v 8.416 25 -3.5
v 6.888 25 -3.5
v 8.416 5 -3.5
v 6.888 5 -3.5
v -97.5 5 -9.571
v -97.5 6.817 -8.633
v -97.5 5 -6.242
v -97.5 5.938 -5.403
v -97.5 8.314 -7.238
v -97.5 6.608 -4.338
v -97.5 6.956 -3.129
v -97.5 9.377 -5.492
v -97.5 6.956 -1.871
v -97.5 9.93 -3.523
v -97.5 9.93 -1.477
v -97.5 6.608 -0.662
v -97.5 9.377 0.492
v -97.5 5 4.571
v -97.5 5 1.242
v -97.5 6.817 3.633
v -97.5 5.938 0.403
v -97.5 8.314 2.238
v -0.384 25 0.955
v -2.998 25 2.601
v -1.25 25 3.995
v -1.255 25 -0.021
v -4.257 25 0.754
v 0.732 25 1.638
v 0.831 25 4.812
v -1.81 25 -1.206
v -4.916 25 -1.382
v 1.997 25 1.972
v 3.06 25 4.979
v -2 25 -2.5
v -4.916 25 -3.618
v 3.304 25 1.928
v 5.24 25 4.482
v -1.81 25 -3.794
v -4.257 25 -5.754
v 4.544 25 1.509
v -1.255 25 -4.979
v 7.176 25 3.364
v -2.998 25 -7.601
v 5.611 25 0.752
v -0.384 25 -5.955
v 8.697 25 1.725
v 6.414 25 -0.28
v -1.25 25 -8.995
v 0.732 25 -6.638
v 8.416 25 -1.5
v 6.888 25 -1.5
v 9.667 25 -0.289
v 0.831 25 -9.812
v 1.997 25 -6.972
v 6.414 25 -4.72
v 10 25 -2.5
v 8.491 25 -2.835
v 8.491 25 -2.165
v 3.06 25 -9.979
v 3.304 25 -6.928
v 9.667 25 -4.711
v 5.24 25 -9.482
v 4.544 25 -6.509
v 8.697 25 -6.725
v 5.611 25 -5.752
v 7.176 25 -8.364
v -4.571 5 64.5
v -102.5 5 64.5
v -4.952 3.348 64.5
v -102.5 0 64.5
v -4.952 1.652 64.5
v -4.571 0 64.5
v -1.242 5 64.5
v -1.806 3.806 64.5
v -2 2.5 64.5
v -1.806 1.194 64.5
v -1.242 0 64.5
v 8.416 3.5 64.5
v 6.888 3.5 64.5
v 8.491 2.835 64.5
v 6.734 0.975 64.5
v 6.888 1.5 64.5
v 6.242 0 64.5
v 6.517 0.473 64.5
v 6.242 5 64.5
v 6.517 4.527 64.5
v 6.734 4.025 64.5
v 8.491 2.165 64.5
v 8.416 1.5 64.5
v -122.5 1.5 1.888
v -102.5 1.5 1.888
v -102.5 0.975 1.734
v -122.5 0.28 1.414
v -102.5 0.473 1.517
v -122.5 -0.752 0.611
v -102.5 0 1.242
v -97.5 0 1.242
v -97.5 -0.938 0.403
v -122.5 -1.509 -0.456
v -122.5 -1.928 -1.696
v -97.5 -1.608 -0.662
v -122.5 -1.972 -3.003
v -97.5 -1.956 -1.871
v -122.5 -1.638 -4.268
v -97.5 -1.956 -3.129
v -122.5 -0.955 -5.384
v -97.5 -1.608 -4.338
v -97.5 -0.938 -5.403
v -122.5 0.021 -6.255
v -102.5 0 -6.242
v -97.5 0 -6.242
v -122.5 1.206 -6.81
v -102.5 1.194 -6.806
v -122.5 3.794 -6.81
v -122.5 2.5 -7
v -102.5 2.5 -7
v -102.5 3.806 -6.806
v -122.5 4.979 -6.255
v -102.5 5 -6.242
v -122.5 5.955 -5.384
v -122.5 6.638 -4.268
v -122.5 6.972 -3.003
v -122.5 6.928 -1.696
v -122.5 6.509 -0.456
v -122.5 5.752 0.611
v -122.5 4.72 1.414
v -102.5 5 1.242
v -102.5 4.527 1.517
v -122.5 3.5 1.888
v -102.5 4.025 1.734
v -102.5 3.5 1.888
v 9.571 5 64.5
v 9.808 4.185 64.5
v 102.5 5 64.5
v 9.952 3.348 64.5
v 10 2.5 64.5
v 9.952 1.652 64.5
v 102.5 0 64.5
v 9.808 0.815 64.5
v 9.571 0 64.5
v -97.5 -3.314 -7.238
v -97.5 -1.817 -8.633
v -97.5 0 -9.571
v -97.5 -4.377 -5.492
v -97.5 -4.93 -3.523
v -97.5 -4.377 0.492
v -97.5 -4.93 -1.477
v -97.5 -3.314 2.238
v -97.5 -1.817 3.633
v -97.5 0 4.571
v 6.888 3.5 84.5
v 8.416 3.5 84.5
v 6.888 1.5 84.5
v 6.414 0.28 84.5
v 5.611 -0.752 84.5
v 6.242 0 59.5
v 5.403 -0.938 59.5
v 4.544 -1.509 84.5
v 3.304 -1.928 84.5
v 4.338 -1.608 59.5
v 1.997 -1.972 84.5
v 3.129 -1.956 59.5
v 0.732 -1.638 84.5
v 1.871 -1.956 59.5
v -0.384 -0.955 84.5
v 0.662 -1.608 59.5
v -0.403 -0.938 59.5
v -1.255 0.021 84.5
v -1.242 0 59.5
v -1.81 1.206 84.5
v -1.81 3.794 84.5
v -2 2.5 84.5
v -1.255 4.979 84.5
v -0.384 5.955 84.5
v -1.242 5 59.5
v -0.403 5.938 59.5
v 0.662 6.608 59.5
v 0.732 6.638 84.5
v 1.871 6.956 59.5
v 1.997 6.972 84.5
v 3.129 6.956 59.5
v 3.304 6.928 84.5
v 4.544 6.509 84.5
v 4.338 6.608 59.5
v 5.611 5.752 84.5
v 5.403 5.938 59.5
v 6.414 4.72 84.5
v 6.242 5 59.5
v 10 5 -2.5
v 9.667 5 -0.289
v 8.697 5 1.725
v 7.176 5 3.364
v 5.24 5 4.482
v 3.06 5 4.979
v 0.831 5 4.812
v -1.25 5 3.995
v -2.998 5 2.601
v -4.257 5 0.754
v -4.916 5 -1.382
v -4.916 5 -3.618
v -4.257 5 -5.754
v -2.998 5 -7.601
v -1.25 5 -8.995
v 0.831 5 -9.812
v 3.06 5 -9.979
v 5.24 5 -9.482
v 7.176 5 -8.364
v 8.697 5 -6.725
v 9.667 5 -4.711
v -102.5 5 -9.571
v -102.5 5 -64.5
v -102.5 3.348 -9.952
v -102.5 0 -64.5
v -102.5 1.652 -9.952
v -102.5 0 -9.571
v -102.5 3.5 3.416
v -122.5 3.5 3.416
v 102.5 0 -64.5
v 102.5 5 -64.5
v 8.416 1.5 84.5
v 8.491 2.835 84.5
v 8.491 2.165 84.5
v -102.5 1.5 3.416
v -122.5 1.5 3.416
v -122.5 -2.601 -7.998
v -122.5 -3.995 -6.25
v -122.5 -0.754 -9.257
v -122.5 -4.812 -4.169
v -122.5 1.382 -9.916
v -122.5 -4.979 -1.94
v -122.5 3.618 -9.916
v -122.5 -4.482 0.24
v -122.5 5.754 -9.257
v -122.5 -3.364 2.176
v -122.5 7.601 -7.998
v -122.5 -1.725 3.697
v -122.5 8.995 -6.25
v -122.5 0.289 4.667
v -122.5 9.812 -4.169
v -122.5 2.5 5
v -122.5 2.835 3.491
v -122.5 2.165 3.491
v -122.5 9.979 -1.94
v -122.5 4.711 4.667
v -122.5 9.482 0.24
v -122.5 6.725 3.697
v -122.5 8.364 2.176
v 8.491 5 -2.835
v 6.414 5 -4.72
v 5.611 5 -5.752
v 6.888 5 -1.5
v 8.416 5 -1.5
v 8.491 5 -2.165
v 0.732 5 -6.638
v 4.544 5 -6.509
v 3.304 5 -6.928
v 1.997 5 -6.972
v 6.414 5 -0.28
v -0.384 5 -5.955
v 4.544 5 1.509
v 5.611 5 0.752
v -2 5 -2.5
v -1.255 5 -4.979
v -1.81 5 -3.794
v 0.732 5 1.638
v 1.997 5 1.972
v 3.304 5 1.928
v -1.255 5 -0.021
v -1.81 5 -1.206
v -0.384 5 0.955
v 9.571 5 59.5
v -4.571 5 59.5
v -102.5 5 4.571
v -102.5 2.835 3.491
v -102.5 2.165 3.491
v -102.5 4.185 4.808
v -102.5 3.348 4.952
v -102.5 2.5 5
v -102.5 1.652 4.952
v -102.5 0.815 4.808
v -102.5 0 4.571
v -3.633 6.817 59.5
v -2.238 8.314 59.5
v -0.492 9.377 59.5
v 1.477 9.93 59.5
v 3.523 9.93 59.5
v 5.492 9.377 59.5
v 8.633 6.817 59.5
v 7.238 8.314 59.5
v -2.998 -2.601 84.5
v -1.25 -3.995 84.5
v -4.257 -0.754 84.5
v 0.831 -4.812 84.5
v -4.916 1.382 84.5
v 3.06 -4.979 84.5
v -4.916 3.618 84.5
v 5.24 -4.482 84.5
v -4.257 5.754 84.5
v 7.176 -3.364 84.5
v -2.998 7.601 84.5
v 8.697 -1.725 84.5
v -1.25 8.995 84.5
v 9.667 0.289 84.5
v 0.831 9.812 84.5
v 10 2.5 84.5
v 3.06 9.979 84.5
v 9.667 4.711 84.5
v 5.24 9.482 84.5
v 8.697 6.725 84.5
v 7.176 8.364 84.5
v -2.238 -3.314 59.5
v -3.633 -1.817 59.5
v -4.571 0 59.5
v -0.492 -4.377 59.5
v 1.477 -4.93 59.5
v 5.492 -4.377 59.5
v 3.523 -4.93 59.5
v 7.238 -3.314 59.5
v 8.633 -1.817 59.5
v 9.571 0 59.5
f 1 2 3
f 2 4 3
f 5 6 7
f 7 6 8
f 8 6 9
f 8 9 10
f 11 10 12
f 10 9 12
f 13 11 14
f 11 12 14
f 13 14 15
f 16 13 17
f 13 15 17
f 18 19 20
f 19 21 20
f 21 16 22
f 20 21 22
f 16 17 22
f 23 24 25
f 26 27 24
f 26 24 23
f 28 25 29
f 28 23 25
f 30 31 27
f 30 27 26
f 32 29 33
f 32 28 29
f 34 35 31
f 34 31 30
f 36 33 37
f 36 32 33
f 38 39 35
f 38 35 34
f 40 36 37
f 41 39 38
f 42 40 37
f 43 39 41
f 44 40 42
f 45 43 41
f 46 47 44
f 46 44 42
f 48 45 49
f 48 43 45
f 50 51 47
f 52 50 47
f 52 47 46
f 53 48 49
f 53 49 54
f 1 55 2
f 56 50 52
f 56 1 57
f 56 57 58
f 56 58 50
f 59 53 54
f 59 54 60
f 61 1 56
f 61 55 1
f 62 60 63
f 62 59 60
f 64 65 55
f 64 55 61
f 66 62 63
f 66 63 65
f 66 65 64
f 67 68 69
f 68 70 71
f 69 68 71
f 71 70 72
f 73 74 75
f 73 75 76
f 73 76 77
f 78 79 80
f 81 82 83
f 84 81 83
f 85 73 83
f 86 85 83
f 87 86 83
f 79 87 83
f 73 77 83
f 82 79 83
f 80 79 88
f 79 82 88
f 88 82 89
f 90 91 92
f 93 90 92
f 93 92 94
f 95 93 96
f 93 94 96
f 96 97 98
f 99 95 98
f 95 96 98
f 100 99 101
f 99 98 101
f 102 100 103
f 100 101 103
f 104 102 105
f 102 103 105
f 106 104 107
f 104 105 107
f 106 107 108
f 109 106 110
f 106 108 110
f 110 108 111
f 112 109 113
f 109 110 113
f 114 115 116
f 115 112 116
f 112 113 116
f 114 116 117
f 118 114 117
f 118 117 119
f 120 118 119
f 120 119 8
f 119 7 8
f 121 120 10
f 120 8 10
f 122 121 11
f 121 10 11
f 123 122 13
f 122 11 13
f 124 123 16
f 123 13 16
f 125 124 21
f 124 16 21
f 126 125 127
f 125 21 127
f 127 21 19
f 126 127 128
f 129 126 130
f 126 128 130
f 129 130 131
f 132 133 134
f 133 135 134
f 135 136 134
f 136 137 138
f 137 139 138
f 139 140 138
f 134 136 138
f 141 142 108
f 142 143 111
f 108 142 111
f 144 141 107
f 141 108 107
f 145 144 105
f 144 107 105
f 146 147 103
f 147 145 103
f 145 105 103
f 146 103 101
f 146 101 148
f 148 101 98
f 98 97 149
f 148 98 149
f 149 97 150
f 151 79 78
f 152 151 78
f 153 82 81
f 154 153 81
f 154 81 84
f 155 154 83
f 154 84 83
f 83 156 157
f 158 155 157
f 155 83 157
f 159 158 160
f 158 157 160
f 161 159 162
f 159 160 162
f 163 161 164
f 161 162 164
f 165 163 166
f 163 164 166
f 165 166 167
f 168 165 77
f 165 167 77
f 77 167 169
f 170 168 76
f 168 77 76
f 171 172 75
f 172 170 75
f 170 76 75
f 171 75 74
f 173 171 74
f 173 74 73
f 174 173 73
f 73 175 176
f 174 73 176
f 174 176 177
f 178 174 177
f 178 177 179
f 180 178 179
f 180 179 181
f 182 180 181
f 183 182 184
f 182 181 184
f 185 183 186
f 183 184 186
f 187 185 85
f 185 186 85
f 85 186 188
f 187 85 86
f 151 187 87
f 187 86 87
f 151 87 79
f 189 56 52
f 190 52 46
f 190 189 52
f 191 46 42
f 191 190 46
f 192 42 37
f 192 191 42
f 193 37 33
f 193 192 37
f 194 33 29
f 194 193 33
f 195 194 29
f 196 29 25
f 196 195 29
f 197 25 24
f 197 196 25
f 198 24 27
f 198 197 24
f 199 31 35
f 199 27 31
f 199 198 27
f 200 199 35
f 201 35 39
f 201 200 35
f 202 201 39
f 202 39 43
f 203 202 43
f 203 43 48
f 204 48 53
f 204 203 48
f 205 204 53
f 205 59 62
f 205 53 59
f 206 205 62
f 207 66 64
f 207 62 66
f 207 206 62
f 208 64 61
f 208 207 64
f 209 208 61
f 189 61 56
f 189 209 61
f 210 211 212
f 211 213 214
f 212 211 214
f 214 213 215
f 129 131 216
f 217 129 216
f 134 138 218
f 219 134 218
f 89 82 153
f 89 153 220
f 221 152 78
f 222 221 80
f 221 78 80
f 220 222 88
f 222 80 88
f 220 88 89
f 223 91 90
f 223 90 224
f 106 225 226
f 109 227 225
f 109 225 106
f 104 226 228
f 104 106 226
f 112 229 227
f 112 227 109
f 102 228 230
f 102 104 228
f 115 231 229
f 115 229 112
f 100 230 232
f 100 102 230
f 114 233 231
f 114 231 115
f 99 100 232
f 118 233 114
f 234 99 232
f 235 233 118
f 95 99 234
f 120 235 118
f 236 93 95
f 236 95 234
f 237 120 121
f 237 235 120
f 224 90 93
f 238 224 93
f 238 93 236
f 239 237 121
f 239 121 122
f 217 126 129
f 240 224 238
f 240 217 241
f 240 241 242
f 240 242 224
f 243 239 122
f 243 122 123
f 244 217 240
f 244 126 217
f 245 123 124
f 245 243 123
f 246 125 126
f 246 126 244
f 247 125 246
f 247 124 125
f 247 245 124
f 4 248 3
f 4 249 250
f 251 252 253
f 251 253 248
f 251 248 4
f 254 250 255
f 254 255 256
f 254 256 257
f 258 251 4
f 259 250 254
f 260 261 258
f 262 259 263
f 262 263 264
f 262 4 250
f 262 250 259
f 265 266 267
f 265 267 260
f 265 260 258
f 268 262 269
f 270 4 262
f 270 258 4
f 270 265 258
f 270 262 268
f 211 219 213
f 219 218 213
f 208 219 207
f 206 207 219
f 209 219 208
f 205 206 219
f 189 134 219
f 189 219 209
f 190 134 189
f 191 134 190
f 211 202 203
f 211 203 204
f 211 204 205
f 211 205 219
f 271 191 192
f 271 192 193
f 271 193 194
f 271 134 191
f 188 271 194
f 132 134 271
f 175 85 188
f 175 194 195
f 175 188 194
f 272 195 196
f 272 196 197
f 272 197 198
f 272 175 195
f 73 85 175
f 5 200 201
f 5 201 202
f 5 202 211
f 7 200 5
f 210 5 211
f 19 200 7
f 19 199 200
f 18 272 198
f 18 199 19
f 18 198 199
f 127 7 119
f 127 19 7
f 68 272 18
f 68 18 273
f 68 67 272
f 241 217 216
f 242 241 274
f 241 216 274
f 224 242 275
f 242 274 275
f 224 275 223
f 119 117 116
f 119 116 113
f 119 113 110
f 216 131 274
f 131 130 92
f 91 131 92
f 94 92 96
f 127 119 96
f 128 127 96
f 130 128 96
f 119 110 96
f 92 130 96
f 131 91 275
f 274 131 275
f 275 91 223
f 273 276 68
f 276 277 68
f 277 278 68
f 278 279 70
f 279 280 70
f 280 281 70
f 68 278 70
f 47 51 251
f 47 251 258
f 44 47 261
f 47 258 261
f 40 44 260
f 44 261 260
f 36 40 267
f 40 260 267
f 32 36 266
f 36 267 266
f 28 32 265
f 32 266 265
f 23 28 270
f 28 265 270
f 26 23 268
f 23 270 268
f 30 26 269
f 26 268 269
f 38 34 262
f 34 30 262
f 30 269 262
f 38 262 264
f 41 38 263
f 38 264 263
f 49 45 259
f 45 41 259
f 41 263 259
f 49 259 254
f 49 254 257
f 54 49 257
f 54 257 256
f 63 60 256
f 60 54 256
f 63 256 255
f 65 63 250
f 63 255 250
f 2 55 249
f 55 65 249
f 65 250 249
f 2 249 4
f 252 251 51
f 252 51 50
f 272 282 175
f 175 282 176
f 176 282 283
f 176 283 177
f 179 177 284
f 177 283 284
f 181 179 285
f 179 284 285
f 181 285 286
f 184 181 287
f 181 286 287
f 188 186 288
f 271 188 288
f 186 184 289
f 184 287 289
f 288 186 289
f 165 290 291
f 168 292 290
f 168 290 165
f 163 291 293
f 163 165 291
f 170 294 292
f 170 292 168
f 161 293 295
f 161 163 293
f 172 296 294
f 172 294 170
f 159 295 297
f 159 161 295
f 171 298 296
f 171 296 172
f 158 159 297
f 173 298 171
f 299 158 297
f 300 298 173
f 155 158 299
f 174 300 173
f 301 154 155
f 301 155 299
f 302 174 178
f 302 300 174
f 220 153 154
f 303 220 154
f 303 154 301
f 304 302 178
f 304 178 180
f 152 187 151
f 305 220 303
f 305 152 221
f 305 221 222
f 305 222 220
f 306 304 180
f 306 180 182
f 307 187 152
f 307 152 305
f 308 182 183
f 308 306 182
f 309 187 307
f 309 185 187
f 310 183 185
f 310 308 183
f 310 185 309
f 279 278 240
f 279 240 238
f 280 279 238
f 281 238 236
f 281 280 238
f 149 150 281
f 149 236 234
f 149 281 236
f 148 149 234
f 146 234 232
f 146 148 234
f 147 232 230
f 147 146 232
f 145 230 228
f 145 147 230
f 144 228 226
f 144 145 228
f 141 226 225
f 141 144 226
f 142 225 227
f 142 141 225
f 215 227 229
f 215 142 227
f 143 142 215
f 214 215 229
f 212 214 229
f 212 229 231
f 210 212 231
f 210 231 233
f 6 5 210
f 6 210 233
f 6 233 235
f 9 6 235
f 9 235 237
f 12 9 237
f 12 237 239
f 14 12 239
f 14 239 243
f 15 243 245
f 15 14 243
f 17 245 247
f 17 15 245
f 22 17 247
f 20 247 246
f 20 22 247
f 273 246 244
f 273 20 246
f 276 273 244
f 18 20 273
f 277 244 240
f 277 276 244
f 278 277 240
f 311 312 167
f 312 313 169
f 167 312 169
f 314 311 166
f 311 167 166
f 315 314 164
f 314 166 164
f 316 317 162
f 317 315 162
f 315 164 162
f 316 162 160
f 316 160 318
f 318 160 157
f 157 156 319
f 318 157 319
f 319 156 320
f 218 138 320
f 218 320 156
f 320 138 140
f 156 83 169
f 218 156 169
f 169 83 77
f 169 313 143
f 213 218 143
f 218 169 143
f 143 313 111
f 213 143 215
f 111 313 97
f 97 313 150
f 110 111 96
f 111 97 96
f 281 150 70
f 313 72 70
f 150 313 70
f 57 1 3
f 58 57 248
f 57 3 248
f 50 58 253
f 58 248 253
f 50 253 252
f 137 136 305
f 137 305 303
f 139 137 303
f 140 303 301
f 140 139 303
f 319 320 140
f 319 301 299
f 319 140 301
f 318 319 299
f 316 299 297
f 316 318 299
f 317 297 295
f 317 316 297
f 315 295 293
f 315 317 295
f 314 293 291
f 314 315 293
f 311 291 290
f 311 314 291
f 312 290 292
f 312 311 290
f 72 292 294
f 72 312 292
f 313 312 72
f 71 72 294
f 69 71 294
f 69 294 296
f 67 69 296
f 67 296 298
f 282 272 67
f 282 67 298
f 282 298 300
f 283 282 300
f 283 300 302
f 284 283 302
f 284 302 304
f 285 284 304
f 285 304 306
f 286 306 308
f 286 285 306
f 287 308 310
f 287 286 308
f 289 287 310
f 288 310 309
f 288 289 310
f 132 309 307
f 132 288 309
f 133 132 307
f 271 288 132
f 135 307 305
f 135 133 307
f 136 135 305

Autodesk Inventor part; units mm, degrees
ref_plane "YZ Plane" through (0, 0, 0) normal (1, 0, 0) x (0, 1, 0)
ref_plane "XZ Plane" through (0, 0, 0) normal (0, 1, 0) x (-1, 0, 0)
ref_plane "XY Plane" through (0, 0, 0) normal (0, 0, 1) x (1, 0, 0)
sketch "Sketch1" plane through (0, 0, 0) normal (0, 1, 0) x (-1, 0, 0)
  line L0 (102.5, 64.5) -> (-102.5, 64.5)
  line L1 (-102.5, 64.5) -> (-102.5, -64.5)
  line L2 (-102.5, -64.5) -> (102.5, -64.5)
  line L3 (102.5, -64.5) -> (102.5, 64.5)
  line L4 (0, 64.5) -> (0, -64.5)
  line L5 (102.5, 0) -> (-102.5, 0)
  point P0 (0, 0)
  dimension "d0" = 129
  dimension "d1" = 205
  dimension "d2" = 0
  dimension "d3" = 0
extrude "Extrusion1" add sketch "Sketch1" along normal blind 5
sketch "Sketch2" plane through (0, 5, 0) normal (0, 1, 0) x (1, 0, 0)
  circle A0 centre (2.5, 2.5) radius 4.5
  circle A1 centre (2.5, 2.5) radius 6
  circle A2 centre (2.5, 2.5) radius 7.5
  circle A3 centre (2.5, 2.5) radius 2.35
  line L0 (6.8875, 3.5) -> (9.933, 3.5)
  line L1 (6.8875, 1.5) -> (9.933, 1.5)
  line L2 (-102.5, 64.5) -> (-102.5, -64.5) projected
  line L3 (102.5, -64.5) -> (102.5, 64.5) projected
  line L4 (-102.5, -64.5) -> (102.5, -64.5)
  line L5 (102.5, -64.5) -> (102.5, 64.5)
  line L6 (102.5, 64.5) -> (-102.5, 64.5)
  line L7 (-102.5, 64.5) -> (-102.5, -64.5)
  line L8 (-102.5, -64.5) -> (102.5, -64.5) projected
  point P0 (0, -64.5)
  point P1 (8.4161, 3.5)
  point P2 (8.4161, 1.5)
  point P3 (-102.5, 0)
  dimension "d18" = 9
  dimension "d19" = 12
  dimension "d20" = 15
  dimension "d21" = 4.7
  dimension "d22" = 1
  dimension "d23" = 1
  dimension "d26" = 0
  dimension "d40" = 67
  dimension "d41" = 105
extrude "Extrusion2" add sketch "Sketch2" along normal blind 20 contours A0 L1 A1 L0 | L0 A2 L1 A1 | A1 L1 A2 L0 picked at (-2.8948, 1.6483)
sketch "Sketch3" plane through (-102.5, 0, 64.5) normal (0, 0, 1) x (1, 0, 0)
  circle A0 centre (105, 2.5) radius 4.5
  circle A1 centre (105, 2.5) radius 6
  circle A2 centre (105, 2.5) radius 7.5
  circle A3 centre (105, 2.5) radius 2.35
  line L0 (109.3875, 3.5) -> (112.433, 3.5)
  line L1 (109.3875, 1.5) -> (112.433, 1.5)
  line L2 (0, 0) -> (0, 5) projected
  point P0 (102.5, 0)
  point P1 (0, 2.5)
  point P2 (110.9161, 3.5)
  point P3 (110.9161, 1.5)
  dimension "d30" = 9
  dimension "d31" = 12
  dimension "d32" = 15
  dimension "d33" = 4.7
  dimension "d34" = 1
  dimension "d35" = 1
  dimension "d36" = 0
  dimension "d37" = 105
  dimension "d38" = 0
extrude "Extrusion3" add sketch "Sketch3" along normal blind 20 and the other way blind 5 contours A0 L1 A1 L0 | L0 A2 L1 A1 | A1 L1 A2 L0 picked at (99.6052, 1.6483)
sketch "Sketch4" plane through (-102.5, 0, -64.5) normal (-1, 0, 0) x (0, 0, 1)
  circle A0 centre (62, 2.5) radius 4.5
  circle A1 centre (62, 2.5) radius 6
  circle A2 centre (62, 2.5) radius 7.5
  circle A3 centre (62, 2.5) radius 2.35
  line L0 (66.3875, 3.5) -> (69.433, 3.5)
  line L1 (66.3875, 1.5) -> (69.433, 1.5)
  line L2 (129, 0) -> (129, 5) projected
  point P0 (64.5, 0)
  point P1 (129, 2.5)
  point P2 (67.9161, 3.5)
  point P3 (67.9161, 1.5)
  dimension "d46" = 9
  dimension "d47" = 12
  dimension "d48" = 15
  dimension "d49" = 4.7
  dimension "d50" = 1
  dimension "d51" = 1
  dimension "d52" = 0
  dimension "d53" = 0
  dimension "d54" = 67
extrude "Extrusion4" add sketch "Sketch4" along normal blind 20 and the other way blind 5 contours A0 L1 A1 L0 | L0 A2 L1 A1 | A1 L1 A2 L0 picked at (56.6052, 1.6483)
properties part number "GroundCorrected"
